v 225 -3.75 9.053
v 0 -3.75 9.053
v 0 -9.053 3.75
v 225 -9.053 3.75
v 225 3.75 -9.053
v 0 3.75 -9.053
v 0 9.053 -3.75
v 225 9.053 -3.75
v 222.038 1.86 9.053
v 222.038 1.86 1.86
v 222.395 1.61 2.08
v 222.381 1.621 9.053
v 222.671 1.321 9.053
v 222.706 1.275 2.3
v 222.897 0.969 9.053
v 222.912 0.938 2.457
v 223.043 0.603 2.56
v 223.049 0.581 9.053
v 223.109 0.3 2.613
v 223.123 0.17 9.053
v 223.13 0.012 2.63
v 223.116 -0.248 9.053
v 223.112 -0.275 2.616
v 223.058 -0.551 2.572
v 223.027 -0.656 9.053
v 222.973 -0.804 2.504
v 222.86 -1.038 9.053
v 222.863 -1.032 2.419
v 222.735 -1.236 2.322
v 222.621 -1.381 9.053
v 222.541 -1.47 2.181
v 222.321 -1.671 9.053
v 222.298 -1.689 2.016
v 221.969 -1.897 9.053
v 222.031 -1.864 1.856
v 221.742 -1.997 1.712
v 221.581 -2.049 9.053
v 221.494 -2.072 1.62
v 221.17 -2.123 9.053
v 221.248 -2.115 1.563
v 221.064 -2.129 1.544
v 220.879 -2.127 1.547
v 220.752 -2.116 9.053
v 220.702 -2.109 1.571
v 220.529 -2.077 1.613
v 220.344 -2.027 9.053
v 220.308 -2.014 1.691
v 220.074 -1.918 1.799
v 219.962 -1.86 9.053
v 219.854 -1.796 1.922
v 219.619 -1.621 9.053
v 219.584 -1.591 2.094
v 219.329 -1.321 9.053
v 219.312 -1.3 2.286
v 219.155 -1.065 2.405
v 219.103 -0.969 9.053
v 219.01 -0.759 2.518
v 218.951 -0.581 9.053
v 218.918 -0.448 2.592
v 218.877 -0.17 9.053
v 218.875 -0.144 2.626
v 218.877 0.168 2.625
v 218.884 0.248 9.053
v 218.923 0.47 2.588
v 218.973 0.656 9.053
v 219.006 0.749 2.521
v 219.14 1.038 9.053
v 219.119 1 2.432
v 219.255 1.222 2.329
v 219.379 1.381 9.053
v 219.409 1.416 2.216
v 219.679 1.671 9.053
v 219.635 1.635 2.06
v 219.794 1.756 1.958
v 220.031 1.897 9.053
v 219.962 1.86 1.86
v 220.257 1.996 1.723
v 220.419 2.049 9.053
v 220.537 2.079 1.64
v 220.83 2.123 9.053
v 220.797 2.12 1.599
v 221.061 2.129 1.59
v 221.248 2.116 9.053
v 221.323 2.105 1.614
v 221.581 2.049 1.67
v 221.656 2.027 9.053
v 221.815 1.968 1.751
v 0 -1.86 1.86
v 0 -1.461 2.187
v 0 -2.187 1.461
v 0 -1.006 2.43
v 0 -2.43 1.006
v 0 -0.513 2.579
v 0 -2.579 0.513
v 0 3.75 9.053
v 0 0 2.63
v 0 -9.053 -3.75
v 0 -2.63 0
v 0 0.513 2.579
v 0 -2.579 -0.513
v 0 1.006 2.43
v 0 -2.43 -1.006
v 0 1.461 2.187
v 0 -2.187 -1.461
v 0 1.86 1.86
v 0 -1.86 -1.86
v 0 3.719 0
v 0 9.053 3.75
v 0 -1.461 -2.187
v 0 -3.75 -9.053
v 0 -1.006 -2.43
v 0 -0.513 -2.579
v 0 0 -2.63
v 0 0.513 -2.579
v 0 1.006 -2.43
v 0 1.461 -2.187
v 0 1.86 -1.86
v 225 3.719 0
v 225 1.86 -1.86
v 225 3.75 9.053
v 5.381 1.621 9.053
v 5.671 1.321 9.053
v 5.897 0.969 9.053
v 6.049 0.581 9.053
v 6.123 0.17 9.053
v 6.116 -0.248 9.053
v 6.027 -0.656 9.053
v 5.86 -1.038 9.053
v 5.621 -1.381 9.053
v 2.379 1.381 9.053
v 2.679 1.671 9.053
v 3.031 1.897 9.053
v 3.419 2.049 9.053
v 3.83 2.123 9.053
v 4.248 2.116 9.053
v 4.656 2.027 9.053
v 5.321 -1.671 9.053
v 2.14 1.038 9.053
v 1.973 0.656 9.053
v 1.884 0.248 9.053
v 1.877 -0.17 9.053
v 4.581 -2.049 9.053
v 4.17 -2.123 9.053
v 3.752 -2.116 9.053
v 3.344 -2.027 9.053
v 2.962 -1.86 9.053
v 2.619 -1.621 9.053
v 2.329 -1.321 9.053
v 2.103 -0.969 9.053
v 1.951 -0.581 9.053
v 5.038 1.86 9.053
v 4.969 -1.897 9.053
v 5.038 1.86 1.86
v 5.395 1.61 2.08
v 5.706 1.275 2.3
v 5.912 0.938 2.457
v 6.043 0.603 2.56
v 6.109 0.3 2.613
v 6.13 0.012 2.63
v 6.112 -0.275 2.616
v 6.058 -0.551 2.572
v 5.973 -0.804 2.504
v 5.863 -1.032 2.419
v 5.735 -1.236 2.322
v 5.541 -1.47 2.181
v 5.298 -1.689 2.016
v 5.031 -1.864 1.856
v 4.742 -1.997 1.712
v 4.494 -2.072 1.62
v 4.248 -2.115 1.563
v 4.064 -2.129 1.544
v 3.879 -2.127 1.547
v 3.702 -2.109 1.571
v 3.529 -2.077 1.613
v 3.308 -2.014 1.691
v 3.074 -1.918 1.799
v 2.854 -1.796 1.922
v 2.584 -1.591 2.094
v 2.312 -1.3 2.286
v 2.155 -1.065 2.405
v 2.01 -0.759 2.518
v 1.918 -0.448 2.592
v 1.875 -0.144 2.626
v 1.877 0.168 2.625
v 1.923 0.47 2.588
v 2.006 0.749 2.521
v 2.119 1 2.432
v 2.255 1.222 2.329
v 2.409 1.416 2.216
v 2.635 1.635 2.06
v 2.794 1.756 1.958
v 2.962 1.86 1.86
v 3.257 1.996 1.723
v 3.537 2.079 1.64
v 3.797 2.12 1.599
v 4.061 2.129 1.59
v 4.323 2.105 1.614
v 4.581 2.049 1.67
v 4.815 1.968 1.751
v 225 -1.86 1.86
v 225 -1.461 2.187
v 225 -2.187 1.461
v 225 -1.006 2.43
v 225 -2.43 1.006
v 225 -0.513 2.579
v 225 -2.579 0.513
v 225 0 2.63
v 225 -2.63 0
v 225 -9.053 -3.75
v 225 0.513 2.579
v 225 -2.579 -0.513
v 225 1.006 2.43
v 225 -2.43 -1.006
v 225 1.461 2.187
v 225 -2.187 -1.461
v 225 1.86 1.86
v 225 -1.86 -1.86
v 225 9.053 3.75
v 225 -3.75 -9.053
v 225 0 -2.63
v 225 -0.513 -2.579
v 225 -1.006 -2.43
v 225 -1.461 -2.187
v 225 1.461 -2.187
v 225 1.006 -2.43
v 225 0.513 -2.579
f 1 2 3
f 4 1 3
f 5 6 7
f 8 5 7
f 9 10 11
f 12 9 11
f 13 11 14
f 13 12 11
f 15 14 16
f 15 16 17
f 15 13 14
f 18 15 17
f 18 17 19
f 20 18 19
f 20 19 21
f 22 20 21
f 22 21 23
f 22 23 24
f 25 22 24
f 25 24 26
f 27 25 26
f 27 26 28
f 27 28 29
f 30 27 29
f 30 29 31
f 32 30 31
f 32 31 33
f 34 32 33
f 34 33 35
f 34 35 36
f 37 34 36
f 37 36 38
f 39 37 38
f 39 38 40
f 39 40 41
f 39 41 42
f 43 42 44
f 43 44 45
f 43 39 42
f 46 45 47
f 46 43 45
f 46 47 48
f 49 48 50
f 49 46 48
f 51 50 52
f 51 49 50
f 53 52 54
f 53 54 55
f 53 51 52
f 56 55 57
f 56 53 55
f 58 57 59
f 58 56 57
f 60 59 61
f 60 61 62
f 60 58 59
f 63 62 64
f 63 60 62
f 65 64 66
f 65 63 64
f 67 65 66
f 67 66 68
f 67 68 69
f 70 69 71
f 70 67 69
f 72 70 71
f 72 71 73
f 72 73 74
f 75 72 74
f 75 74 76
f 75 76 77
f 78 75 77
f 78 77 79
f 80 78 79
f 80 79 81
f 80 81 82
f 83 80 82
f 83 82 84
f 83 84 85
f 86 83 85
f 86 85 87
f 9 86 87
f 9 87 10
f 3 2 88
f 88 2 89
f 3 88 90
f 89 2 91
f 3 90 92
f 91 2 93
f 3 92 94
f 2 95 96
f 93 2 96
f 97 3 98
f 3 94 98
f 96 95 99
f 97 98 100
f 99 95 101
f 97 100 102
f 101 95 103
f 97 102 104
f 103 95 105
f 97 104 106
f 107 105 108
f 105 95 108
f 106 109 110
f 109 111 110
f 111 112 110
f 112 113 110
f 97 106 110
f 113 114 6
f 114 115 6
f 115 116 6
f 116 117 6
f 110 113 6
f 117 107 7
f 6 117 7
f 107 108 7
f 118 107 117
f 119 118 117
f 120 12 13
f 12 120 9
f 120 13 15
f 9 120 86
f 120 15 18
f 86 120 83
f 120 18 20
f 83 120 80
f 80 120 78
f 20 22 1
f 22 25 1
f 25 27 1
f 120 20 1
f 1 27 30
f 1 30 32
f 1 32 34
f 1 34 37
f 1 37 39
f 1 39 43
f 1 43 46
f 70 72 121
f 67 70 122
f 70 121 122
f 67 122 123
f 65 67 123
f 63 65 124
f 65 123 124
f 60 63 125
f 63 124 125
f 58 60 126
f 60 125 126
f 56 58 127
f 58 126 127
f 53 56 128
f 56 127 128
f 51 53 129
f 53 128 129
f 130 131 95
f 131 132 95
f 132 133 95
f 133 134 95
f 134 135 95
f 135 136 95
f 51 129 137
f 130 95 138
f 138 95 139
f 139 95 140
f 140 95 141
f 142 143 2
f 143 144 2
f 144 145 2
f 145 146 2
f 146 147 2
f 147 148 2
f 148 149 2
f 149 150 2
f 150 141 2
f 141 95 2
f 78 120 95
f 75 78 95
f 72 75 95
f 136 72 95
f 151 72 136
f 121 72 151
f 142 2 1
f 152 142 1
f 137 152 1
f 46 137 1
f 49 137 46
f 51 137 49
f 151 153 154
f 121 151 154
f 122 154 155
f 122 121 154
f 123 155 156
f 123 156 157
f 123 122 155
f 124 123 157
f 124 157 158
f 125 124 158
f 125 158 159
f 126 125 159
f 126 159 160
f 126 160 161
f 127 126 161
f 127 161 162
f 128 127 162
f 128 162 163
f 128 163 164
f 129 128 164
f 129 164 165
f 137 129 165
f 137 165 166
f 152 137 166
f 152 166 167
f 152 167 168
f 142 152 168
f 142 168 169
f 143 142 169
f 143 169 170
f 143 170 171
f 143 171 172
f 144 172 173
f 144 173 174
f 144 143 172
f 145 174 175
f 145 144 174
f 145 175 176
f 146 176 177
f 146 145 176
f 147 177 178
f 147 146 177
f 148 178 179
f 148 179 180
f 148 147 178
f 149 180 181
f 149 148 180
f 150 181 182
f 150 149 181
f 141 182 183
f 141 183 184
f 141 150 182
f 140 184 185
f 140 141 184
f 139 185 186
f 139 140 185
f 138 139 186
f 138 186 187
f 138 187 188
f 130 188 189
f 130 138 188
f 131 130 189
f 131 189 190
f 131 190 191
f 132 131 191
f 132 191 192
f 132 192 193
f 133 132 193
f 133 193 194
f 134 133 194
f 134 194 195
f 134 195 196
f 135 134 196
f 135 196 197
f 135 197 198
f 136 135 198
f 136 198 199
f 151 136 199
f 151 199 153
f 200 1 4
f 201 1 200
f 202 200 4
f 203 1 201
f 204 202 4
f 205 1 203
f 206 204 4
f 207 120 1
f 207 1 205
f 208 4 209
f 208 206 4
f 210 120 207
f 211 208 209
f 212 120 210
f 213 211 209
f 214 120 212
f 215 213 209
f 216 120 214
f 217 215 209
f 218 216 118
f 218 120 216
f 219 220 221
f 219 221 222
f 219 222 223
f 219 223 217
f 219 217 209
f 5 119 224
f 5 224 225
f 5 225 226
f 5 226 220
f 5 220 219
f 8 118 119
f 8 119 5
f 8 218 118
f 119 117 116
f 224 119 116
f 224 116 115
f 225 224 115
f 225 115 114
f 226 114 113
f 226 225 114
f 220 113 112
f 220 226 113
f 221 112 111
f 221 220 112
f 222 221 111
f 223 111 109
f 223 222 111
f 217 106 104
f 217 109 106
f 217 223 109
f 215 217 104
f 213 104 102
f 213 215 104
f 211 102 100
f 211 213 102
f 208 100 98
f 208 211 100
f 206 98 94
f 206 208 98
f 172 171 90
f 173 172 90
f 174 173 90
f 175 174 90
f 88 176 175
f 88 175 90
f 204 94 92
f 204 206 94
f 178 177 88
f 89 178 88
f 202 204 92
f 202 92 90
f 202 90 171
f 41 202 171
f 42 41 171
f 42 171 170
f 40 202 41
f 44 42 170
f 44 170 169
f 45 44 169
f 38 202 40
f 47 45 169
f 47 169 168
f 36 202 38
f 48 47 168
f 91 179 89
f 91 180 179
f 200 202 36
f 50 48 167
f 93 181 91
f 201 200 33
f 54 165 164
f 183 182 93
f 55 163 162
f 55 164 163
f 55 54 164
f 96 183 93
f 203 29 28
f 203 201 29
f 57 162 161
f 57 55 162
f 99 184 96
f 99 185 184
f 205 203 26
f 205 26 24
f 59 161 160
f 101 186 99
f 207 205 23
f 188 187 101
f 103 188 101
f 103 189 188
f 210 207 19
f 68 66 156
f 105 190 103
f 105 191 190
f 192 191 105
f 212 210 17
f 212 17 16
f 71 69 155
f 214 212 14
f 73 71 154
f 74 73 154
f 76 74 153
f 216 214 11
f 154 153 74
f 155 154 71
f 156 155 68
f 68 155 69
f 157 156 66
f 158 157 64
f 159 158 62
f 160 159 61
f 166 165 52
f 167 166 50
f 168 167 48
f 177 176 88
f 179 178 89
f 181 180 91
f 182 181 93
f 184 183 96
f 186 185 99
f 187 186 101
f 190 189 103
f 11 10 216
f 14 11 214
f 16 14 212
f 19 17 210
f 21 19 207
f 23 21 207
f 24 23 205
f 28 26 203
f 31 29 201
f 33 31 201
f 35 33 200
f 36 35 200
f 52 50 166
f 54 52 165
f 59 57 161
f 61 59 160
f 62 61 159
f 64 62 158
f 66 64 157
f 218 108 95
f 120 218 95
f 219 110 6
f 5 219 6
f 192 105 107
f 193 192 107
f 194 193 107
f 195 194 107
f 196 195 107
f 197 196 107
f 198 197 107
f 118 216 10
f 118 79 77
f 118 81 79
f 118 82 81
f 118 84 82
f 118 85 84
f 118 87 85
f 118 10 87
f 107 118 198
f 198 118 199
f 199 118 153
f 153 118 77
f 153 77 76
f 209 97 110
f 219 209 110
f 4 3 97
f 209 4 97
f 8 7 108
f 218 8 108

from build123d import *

# Parameters (mm, degrees)
EXTRUDE_1_DEPTH     = 225
CUT_EXTRUDE_1_DEPTH = 226.363982288
SKETCH_4_R          = 2.13
CUT_EXTRUDE_2_DEPTH = 8.5


with BuildPart() as part:
    # 草图1 → 凸台-拉伸1 (new body)
    with BuildSketch(Plane(origin=(0, 0, 0), x_dir=(0, 0, -1), z_dir=(1, 0, 0))):
        Polygon((9.053300859, -3.75), (9.053300859, 3.75), (3.75, 9.053300859), (-3.75, 9.053300859), (-9.053300859, 3.75), (-9.053300859, -3.75), (-3.75, -9.053300859), (3.75, -9.053300859), align=None)
    extrude(amount=EXTRUDE_1_DEPTH)

    # 草图2 → 切除-拉伸1 (cut, through all)
    with BuildSketch(Plane(origin=(225, 0, 0), x_dir=(0, 0, -1), z_dir=(1, 0, 0))):
        with BuildLine():
            Line((-1.859690835, 1.859690835), (0, 3.719381669))
            Line((0, 3.719381669), (1.859690835, 1.859690835))
            ThreePointArc((1.859690835, 1.859690835), (0, -2.63), (-1.859690835, 1.859690835))
        make_face()
    extrude(amount=-CUT_EXTRUDE_1_DEPTH, mode=Mode.SUBTRACT)

    # 草图4 → 切除-拉伸2 (cut)
    with BuildSketch(Plane(origin=(0, 0, 9.053300859), x_dir=(1, 0, 0), z_dir=(0, 0, -1))):
        with Locations((4, 0)):
            Circle(SKETCH_4_R)
        with Locations((221, 0)):
            Circle(SKETCH_4_R)
    extrude(amount=CUT_EXTRUDE_2_DEPTH, mode=Mode.SUBTRACT)


solid = part.part
